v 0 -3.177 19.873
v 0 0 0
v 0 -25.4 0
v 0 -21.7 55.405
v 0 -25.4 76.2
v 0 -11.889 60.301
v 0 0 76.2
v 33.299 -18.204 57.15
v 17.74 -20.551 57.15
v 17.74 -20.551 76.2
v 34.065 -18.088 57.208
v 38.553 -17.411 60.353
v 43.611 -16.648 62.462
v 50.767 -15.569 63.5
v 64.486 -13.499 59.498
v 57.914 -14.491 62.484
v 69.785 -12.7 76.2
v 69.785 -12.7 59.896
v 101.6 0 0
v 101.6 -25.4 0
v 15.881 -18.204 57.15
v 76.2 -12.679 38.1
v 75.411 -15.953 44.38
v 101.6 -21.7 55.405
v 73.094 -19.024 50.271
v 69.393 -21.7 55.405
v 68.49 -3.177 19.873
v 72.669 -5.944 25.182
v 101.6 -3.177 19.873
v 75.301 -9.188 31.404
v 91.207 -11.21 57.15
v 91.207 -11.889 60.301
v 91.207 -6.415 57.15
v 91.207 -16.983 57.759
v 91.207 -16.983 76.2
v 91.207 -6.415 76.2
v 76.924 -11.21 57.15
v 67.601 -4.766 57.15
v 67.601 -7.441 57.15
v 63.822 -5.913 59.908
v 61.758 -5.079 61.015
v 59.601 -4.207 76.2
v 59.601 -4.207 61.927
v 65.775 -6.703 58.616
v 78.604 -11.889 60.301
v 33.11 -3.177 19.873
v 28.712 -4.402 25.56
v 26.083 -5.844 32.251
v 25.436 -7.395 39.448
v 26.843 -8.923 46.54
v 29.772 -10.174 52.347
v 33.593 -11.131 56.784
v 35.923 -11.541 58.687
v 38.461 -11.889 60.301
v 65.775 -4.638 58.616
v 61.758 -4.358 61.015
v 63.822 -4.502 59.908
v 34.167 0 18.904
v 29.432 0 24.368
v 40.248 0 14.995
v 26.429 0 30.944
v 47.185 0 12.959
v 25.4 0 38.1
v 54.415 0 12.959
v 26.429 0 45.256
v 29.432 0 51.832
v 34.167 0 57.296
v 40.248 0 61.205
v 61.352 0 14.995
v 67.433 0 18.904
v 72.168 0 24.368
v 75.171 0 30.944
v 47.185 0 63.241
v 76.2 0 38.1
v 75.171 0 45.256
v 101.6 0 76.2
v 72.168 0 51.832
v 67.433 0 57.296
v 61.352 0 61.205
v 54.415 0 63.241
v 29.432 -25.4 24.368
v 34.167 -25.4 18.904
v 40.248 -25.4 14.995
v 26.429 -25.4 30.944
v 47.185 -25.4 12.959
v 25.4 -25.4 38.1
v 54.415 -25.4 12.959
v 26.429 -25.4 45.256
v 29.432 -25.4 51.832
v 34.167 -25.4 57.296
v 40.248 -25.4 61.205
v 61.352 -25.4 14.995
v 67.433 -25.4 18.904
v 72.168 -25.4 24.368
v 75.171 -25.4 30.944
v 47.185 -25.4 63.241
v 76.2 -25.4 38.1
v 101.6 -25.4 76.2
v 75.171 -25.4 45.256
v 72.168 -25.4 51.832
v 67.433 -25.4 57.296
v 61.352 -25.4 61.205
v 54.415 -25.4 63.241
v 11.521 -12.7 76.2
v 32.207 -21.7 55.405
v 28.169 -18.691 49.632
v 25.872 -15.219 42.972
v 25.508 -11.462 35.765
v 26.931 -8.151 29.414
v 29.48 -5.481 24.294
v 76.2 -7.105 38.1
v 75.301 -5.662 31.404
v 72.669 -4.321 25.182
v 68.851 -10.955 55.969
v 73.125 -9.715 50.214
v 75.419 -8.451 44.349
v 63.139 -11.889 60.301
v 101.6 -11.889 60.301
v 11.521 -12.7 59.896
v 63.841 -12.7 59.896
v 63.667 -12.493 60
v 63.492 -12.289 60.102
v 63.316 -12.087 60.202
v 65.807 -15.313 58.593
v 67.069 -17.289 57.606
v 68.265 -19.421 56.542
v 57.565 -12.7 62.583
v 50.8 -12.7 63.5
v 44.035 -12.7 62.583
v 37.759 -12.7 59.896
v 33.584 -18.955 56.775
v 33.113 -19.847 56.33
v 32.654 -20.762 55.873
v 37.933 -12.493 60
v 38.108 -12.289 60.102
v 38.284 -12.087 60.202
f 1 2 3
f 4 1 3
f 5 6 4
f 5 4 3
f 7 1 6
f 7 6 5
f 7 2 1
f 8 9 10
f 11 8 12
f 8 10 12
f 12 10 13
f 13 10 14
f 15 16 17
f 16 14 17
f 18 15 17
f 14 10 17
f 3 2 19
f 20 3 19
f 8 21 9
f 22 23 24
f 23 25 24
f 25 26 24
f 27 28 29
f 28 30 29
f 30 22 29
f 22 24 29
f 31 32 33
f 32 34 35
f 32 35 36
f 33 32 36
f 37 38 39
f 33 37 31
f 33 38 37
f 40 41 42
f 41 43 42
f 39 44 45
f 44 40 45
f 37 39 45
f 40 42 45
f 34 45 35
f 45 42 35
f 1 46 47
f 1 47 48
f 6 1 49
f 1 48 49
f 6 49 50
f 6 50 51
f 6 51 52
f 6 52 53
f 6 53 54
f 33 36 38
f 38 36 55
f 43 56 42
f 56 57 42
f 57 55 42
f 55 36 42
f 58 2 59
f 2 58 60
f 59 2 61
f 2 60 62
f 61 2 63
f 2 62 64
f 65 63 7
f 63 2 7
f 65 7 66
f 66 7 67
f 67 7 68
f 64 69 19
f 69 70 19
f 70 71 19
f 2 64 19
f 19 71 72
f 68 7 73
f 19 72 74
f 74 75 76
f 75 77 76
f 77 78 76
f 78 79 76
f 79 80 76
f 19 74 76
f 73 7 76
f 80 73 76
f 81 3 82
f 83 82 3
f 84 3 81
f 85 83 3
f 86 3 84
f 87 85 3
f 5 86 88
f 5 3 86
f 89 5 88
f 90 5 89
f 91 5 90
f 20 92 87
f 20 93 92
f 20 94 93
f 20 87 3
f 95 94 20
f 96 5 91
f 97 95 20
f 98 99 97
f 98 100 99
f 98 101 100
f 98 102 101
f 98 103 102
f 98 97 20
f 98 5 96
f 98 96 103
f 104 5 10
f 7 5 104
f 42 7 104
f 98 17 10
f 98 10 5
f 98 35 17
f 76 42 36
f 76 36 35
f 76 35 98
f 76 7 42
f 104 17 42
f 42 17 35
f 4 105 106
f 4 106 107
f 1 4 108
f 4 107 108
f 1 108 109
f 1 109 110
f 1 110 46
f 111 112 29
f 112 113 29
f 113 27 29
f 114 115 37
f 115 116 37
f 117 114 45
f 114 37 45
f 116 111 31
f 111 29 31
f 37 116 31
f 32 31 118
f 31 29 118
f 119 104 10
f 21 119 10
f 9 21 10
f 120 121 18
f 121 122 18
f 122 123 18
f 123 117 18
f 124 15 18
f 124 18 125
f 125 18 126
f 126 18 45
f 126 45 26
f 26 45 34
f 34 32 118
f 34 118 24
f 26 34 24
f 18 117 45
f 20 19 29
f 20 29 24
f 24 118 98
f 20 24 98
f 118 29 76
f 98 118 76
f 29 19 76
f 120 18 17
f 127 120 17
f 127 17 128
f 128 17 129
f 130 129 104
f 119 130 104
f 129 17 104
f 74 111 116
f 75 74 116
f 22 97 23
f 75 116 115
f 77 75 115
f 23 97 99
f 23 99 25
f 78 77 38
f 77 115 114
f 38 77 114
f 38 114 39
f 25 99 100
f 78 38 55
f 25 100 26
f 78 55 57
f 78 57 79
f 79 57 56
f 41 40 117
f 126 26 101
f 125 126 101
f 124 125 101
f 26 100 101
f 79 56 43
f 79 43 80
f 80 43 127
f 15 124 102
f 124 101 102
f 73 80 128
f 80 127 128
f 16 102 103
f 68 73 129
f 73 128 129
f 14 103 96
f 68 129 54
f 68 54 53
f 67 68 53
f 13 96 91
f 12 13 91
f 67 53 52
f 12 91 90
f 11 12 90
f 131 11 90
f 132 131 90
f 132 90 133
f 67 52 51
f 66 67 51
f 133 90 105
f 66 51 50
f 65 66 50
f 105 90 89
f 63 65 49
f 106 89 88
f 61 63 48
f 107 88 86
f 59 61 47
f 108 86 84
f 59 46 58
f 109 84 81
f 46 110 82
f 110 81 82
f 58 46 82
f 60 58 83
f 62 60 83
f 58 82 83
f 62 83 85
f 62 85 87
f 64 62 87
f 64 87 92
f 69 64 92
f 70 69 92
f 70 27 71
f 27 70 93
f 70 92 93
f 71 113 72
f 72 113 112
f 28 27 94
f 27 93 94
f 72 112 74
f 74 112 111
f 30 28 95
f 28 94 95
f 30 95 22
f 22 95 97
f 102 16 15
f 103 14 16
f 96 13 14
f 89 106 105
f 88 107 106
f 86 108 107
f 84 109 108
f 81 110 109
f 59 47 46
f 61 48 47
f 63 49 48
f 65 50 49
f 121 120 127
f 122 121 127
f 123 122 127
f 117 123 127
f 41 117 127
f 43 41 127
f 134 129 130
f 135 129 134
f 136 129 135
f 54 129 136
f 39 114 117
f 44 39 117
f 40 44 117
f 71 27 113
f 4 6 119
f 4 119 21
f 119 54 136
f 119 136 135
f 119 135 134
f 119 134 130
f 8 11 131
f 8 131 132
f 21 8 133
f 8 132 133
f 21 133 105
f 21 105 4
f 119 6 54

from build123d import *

# Parameters (mm, degrees)
F0_W     = 101.6
F0_H     = 76.2
F1_DEPTH = 25.4
F2_R     = 25.4
F3_DEPTH = 25.401
F5_DEPTH = 19.05
F7_DEPTH = 19.05
F9_DEPTH = 101.601


with BuildPart() as f1:
    # F0 (on Front) → F1 (new body)
    with BuildSketch(Plane.XZ):
        with Locations((50.8, 38.1)):
            Rectangle(F0_W, F0_H)
    extrude(amount=F1_DEPTH)

    # F2 (on face) → F3 (cut, through all)
    with BuildSketch(Plane.XZ.offset(25.4)):
        with Locations((50.8, 38.1)):
            Circle(F2_R)
    extrude(amount=-F3_DEPTH, mode=Mode.SUBTRACT)

    # F4 (on face) → F5 (cut)
    with BuildSketch(Plane.XY.offset(76.2)):
        Polygon((69.784895, -12.7), (11.520899, -12.7), (17.740097, -20.550709), align=None)
    extrude(amount=-F5_DEPTH, mode=Mode.SUBTRACT)

    # F6 (on face) → F7 (cut)
    with BuildSketch(Plane.XY.offset(76.2)):
        Polygon((59.600811, -4.206988), (91.207154, -16.983436), (91.207154, -6.414911), align=None)
    extrude(amount=-F7_DEPTH, mode=Mode.SUBTRACT)

    # F8 (on face) → F9 (cut, through all)
    with BuildSketch(Plane.YZ.offset(101.6)):
        Polygon((-3.176994, 19.873125), (-11.888587, 60.30136), (-21.700324, 55.405151), align=None)
    extrude(amount=-F9_DEPTH, mode=Mode.SUBTRACT)


solid = f1.part
